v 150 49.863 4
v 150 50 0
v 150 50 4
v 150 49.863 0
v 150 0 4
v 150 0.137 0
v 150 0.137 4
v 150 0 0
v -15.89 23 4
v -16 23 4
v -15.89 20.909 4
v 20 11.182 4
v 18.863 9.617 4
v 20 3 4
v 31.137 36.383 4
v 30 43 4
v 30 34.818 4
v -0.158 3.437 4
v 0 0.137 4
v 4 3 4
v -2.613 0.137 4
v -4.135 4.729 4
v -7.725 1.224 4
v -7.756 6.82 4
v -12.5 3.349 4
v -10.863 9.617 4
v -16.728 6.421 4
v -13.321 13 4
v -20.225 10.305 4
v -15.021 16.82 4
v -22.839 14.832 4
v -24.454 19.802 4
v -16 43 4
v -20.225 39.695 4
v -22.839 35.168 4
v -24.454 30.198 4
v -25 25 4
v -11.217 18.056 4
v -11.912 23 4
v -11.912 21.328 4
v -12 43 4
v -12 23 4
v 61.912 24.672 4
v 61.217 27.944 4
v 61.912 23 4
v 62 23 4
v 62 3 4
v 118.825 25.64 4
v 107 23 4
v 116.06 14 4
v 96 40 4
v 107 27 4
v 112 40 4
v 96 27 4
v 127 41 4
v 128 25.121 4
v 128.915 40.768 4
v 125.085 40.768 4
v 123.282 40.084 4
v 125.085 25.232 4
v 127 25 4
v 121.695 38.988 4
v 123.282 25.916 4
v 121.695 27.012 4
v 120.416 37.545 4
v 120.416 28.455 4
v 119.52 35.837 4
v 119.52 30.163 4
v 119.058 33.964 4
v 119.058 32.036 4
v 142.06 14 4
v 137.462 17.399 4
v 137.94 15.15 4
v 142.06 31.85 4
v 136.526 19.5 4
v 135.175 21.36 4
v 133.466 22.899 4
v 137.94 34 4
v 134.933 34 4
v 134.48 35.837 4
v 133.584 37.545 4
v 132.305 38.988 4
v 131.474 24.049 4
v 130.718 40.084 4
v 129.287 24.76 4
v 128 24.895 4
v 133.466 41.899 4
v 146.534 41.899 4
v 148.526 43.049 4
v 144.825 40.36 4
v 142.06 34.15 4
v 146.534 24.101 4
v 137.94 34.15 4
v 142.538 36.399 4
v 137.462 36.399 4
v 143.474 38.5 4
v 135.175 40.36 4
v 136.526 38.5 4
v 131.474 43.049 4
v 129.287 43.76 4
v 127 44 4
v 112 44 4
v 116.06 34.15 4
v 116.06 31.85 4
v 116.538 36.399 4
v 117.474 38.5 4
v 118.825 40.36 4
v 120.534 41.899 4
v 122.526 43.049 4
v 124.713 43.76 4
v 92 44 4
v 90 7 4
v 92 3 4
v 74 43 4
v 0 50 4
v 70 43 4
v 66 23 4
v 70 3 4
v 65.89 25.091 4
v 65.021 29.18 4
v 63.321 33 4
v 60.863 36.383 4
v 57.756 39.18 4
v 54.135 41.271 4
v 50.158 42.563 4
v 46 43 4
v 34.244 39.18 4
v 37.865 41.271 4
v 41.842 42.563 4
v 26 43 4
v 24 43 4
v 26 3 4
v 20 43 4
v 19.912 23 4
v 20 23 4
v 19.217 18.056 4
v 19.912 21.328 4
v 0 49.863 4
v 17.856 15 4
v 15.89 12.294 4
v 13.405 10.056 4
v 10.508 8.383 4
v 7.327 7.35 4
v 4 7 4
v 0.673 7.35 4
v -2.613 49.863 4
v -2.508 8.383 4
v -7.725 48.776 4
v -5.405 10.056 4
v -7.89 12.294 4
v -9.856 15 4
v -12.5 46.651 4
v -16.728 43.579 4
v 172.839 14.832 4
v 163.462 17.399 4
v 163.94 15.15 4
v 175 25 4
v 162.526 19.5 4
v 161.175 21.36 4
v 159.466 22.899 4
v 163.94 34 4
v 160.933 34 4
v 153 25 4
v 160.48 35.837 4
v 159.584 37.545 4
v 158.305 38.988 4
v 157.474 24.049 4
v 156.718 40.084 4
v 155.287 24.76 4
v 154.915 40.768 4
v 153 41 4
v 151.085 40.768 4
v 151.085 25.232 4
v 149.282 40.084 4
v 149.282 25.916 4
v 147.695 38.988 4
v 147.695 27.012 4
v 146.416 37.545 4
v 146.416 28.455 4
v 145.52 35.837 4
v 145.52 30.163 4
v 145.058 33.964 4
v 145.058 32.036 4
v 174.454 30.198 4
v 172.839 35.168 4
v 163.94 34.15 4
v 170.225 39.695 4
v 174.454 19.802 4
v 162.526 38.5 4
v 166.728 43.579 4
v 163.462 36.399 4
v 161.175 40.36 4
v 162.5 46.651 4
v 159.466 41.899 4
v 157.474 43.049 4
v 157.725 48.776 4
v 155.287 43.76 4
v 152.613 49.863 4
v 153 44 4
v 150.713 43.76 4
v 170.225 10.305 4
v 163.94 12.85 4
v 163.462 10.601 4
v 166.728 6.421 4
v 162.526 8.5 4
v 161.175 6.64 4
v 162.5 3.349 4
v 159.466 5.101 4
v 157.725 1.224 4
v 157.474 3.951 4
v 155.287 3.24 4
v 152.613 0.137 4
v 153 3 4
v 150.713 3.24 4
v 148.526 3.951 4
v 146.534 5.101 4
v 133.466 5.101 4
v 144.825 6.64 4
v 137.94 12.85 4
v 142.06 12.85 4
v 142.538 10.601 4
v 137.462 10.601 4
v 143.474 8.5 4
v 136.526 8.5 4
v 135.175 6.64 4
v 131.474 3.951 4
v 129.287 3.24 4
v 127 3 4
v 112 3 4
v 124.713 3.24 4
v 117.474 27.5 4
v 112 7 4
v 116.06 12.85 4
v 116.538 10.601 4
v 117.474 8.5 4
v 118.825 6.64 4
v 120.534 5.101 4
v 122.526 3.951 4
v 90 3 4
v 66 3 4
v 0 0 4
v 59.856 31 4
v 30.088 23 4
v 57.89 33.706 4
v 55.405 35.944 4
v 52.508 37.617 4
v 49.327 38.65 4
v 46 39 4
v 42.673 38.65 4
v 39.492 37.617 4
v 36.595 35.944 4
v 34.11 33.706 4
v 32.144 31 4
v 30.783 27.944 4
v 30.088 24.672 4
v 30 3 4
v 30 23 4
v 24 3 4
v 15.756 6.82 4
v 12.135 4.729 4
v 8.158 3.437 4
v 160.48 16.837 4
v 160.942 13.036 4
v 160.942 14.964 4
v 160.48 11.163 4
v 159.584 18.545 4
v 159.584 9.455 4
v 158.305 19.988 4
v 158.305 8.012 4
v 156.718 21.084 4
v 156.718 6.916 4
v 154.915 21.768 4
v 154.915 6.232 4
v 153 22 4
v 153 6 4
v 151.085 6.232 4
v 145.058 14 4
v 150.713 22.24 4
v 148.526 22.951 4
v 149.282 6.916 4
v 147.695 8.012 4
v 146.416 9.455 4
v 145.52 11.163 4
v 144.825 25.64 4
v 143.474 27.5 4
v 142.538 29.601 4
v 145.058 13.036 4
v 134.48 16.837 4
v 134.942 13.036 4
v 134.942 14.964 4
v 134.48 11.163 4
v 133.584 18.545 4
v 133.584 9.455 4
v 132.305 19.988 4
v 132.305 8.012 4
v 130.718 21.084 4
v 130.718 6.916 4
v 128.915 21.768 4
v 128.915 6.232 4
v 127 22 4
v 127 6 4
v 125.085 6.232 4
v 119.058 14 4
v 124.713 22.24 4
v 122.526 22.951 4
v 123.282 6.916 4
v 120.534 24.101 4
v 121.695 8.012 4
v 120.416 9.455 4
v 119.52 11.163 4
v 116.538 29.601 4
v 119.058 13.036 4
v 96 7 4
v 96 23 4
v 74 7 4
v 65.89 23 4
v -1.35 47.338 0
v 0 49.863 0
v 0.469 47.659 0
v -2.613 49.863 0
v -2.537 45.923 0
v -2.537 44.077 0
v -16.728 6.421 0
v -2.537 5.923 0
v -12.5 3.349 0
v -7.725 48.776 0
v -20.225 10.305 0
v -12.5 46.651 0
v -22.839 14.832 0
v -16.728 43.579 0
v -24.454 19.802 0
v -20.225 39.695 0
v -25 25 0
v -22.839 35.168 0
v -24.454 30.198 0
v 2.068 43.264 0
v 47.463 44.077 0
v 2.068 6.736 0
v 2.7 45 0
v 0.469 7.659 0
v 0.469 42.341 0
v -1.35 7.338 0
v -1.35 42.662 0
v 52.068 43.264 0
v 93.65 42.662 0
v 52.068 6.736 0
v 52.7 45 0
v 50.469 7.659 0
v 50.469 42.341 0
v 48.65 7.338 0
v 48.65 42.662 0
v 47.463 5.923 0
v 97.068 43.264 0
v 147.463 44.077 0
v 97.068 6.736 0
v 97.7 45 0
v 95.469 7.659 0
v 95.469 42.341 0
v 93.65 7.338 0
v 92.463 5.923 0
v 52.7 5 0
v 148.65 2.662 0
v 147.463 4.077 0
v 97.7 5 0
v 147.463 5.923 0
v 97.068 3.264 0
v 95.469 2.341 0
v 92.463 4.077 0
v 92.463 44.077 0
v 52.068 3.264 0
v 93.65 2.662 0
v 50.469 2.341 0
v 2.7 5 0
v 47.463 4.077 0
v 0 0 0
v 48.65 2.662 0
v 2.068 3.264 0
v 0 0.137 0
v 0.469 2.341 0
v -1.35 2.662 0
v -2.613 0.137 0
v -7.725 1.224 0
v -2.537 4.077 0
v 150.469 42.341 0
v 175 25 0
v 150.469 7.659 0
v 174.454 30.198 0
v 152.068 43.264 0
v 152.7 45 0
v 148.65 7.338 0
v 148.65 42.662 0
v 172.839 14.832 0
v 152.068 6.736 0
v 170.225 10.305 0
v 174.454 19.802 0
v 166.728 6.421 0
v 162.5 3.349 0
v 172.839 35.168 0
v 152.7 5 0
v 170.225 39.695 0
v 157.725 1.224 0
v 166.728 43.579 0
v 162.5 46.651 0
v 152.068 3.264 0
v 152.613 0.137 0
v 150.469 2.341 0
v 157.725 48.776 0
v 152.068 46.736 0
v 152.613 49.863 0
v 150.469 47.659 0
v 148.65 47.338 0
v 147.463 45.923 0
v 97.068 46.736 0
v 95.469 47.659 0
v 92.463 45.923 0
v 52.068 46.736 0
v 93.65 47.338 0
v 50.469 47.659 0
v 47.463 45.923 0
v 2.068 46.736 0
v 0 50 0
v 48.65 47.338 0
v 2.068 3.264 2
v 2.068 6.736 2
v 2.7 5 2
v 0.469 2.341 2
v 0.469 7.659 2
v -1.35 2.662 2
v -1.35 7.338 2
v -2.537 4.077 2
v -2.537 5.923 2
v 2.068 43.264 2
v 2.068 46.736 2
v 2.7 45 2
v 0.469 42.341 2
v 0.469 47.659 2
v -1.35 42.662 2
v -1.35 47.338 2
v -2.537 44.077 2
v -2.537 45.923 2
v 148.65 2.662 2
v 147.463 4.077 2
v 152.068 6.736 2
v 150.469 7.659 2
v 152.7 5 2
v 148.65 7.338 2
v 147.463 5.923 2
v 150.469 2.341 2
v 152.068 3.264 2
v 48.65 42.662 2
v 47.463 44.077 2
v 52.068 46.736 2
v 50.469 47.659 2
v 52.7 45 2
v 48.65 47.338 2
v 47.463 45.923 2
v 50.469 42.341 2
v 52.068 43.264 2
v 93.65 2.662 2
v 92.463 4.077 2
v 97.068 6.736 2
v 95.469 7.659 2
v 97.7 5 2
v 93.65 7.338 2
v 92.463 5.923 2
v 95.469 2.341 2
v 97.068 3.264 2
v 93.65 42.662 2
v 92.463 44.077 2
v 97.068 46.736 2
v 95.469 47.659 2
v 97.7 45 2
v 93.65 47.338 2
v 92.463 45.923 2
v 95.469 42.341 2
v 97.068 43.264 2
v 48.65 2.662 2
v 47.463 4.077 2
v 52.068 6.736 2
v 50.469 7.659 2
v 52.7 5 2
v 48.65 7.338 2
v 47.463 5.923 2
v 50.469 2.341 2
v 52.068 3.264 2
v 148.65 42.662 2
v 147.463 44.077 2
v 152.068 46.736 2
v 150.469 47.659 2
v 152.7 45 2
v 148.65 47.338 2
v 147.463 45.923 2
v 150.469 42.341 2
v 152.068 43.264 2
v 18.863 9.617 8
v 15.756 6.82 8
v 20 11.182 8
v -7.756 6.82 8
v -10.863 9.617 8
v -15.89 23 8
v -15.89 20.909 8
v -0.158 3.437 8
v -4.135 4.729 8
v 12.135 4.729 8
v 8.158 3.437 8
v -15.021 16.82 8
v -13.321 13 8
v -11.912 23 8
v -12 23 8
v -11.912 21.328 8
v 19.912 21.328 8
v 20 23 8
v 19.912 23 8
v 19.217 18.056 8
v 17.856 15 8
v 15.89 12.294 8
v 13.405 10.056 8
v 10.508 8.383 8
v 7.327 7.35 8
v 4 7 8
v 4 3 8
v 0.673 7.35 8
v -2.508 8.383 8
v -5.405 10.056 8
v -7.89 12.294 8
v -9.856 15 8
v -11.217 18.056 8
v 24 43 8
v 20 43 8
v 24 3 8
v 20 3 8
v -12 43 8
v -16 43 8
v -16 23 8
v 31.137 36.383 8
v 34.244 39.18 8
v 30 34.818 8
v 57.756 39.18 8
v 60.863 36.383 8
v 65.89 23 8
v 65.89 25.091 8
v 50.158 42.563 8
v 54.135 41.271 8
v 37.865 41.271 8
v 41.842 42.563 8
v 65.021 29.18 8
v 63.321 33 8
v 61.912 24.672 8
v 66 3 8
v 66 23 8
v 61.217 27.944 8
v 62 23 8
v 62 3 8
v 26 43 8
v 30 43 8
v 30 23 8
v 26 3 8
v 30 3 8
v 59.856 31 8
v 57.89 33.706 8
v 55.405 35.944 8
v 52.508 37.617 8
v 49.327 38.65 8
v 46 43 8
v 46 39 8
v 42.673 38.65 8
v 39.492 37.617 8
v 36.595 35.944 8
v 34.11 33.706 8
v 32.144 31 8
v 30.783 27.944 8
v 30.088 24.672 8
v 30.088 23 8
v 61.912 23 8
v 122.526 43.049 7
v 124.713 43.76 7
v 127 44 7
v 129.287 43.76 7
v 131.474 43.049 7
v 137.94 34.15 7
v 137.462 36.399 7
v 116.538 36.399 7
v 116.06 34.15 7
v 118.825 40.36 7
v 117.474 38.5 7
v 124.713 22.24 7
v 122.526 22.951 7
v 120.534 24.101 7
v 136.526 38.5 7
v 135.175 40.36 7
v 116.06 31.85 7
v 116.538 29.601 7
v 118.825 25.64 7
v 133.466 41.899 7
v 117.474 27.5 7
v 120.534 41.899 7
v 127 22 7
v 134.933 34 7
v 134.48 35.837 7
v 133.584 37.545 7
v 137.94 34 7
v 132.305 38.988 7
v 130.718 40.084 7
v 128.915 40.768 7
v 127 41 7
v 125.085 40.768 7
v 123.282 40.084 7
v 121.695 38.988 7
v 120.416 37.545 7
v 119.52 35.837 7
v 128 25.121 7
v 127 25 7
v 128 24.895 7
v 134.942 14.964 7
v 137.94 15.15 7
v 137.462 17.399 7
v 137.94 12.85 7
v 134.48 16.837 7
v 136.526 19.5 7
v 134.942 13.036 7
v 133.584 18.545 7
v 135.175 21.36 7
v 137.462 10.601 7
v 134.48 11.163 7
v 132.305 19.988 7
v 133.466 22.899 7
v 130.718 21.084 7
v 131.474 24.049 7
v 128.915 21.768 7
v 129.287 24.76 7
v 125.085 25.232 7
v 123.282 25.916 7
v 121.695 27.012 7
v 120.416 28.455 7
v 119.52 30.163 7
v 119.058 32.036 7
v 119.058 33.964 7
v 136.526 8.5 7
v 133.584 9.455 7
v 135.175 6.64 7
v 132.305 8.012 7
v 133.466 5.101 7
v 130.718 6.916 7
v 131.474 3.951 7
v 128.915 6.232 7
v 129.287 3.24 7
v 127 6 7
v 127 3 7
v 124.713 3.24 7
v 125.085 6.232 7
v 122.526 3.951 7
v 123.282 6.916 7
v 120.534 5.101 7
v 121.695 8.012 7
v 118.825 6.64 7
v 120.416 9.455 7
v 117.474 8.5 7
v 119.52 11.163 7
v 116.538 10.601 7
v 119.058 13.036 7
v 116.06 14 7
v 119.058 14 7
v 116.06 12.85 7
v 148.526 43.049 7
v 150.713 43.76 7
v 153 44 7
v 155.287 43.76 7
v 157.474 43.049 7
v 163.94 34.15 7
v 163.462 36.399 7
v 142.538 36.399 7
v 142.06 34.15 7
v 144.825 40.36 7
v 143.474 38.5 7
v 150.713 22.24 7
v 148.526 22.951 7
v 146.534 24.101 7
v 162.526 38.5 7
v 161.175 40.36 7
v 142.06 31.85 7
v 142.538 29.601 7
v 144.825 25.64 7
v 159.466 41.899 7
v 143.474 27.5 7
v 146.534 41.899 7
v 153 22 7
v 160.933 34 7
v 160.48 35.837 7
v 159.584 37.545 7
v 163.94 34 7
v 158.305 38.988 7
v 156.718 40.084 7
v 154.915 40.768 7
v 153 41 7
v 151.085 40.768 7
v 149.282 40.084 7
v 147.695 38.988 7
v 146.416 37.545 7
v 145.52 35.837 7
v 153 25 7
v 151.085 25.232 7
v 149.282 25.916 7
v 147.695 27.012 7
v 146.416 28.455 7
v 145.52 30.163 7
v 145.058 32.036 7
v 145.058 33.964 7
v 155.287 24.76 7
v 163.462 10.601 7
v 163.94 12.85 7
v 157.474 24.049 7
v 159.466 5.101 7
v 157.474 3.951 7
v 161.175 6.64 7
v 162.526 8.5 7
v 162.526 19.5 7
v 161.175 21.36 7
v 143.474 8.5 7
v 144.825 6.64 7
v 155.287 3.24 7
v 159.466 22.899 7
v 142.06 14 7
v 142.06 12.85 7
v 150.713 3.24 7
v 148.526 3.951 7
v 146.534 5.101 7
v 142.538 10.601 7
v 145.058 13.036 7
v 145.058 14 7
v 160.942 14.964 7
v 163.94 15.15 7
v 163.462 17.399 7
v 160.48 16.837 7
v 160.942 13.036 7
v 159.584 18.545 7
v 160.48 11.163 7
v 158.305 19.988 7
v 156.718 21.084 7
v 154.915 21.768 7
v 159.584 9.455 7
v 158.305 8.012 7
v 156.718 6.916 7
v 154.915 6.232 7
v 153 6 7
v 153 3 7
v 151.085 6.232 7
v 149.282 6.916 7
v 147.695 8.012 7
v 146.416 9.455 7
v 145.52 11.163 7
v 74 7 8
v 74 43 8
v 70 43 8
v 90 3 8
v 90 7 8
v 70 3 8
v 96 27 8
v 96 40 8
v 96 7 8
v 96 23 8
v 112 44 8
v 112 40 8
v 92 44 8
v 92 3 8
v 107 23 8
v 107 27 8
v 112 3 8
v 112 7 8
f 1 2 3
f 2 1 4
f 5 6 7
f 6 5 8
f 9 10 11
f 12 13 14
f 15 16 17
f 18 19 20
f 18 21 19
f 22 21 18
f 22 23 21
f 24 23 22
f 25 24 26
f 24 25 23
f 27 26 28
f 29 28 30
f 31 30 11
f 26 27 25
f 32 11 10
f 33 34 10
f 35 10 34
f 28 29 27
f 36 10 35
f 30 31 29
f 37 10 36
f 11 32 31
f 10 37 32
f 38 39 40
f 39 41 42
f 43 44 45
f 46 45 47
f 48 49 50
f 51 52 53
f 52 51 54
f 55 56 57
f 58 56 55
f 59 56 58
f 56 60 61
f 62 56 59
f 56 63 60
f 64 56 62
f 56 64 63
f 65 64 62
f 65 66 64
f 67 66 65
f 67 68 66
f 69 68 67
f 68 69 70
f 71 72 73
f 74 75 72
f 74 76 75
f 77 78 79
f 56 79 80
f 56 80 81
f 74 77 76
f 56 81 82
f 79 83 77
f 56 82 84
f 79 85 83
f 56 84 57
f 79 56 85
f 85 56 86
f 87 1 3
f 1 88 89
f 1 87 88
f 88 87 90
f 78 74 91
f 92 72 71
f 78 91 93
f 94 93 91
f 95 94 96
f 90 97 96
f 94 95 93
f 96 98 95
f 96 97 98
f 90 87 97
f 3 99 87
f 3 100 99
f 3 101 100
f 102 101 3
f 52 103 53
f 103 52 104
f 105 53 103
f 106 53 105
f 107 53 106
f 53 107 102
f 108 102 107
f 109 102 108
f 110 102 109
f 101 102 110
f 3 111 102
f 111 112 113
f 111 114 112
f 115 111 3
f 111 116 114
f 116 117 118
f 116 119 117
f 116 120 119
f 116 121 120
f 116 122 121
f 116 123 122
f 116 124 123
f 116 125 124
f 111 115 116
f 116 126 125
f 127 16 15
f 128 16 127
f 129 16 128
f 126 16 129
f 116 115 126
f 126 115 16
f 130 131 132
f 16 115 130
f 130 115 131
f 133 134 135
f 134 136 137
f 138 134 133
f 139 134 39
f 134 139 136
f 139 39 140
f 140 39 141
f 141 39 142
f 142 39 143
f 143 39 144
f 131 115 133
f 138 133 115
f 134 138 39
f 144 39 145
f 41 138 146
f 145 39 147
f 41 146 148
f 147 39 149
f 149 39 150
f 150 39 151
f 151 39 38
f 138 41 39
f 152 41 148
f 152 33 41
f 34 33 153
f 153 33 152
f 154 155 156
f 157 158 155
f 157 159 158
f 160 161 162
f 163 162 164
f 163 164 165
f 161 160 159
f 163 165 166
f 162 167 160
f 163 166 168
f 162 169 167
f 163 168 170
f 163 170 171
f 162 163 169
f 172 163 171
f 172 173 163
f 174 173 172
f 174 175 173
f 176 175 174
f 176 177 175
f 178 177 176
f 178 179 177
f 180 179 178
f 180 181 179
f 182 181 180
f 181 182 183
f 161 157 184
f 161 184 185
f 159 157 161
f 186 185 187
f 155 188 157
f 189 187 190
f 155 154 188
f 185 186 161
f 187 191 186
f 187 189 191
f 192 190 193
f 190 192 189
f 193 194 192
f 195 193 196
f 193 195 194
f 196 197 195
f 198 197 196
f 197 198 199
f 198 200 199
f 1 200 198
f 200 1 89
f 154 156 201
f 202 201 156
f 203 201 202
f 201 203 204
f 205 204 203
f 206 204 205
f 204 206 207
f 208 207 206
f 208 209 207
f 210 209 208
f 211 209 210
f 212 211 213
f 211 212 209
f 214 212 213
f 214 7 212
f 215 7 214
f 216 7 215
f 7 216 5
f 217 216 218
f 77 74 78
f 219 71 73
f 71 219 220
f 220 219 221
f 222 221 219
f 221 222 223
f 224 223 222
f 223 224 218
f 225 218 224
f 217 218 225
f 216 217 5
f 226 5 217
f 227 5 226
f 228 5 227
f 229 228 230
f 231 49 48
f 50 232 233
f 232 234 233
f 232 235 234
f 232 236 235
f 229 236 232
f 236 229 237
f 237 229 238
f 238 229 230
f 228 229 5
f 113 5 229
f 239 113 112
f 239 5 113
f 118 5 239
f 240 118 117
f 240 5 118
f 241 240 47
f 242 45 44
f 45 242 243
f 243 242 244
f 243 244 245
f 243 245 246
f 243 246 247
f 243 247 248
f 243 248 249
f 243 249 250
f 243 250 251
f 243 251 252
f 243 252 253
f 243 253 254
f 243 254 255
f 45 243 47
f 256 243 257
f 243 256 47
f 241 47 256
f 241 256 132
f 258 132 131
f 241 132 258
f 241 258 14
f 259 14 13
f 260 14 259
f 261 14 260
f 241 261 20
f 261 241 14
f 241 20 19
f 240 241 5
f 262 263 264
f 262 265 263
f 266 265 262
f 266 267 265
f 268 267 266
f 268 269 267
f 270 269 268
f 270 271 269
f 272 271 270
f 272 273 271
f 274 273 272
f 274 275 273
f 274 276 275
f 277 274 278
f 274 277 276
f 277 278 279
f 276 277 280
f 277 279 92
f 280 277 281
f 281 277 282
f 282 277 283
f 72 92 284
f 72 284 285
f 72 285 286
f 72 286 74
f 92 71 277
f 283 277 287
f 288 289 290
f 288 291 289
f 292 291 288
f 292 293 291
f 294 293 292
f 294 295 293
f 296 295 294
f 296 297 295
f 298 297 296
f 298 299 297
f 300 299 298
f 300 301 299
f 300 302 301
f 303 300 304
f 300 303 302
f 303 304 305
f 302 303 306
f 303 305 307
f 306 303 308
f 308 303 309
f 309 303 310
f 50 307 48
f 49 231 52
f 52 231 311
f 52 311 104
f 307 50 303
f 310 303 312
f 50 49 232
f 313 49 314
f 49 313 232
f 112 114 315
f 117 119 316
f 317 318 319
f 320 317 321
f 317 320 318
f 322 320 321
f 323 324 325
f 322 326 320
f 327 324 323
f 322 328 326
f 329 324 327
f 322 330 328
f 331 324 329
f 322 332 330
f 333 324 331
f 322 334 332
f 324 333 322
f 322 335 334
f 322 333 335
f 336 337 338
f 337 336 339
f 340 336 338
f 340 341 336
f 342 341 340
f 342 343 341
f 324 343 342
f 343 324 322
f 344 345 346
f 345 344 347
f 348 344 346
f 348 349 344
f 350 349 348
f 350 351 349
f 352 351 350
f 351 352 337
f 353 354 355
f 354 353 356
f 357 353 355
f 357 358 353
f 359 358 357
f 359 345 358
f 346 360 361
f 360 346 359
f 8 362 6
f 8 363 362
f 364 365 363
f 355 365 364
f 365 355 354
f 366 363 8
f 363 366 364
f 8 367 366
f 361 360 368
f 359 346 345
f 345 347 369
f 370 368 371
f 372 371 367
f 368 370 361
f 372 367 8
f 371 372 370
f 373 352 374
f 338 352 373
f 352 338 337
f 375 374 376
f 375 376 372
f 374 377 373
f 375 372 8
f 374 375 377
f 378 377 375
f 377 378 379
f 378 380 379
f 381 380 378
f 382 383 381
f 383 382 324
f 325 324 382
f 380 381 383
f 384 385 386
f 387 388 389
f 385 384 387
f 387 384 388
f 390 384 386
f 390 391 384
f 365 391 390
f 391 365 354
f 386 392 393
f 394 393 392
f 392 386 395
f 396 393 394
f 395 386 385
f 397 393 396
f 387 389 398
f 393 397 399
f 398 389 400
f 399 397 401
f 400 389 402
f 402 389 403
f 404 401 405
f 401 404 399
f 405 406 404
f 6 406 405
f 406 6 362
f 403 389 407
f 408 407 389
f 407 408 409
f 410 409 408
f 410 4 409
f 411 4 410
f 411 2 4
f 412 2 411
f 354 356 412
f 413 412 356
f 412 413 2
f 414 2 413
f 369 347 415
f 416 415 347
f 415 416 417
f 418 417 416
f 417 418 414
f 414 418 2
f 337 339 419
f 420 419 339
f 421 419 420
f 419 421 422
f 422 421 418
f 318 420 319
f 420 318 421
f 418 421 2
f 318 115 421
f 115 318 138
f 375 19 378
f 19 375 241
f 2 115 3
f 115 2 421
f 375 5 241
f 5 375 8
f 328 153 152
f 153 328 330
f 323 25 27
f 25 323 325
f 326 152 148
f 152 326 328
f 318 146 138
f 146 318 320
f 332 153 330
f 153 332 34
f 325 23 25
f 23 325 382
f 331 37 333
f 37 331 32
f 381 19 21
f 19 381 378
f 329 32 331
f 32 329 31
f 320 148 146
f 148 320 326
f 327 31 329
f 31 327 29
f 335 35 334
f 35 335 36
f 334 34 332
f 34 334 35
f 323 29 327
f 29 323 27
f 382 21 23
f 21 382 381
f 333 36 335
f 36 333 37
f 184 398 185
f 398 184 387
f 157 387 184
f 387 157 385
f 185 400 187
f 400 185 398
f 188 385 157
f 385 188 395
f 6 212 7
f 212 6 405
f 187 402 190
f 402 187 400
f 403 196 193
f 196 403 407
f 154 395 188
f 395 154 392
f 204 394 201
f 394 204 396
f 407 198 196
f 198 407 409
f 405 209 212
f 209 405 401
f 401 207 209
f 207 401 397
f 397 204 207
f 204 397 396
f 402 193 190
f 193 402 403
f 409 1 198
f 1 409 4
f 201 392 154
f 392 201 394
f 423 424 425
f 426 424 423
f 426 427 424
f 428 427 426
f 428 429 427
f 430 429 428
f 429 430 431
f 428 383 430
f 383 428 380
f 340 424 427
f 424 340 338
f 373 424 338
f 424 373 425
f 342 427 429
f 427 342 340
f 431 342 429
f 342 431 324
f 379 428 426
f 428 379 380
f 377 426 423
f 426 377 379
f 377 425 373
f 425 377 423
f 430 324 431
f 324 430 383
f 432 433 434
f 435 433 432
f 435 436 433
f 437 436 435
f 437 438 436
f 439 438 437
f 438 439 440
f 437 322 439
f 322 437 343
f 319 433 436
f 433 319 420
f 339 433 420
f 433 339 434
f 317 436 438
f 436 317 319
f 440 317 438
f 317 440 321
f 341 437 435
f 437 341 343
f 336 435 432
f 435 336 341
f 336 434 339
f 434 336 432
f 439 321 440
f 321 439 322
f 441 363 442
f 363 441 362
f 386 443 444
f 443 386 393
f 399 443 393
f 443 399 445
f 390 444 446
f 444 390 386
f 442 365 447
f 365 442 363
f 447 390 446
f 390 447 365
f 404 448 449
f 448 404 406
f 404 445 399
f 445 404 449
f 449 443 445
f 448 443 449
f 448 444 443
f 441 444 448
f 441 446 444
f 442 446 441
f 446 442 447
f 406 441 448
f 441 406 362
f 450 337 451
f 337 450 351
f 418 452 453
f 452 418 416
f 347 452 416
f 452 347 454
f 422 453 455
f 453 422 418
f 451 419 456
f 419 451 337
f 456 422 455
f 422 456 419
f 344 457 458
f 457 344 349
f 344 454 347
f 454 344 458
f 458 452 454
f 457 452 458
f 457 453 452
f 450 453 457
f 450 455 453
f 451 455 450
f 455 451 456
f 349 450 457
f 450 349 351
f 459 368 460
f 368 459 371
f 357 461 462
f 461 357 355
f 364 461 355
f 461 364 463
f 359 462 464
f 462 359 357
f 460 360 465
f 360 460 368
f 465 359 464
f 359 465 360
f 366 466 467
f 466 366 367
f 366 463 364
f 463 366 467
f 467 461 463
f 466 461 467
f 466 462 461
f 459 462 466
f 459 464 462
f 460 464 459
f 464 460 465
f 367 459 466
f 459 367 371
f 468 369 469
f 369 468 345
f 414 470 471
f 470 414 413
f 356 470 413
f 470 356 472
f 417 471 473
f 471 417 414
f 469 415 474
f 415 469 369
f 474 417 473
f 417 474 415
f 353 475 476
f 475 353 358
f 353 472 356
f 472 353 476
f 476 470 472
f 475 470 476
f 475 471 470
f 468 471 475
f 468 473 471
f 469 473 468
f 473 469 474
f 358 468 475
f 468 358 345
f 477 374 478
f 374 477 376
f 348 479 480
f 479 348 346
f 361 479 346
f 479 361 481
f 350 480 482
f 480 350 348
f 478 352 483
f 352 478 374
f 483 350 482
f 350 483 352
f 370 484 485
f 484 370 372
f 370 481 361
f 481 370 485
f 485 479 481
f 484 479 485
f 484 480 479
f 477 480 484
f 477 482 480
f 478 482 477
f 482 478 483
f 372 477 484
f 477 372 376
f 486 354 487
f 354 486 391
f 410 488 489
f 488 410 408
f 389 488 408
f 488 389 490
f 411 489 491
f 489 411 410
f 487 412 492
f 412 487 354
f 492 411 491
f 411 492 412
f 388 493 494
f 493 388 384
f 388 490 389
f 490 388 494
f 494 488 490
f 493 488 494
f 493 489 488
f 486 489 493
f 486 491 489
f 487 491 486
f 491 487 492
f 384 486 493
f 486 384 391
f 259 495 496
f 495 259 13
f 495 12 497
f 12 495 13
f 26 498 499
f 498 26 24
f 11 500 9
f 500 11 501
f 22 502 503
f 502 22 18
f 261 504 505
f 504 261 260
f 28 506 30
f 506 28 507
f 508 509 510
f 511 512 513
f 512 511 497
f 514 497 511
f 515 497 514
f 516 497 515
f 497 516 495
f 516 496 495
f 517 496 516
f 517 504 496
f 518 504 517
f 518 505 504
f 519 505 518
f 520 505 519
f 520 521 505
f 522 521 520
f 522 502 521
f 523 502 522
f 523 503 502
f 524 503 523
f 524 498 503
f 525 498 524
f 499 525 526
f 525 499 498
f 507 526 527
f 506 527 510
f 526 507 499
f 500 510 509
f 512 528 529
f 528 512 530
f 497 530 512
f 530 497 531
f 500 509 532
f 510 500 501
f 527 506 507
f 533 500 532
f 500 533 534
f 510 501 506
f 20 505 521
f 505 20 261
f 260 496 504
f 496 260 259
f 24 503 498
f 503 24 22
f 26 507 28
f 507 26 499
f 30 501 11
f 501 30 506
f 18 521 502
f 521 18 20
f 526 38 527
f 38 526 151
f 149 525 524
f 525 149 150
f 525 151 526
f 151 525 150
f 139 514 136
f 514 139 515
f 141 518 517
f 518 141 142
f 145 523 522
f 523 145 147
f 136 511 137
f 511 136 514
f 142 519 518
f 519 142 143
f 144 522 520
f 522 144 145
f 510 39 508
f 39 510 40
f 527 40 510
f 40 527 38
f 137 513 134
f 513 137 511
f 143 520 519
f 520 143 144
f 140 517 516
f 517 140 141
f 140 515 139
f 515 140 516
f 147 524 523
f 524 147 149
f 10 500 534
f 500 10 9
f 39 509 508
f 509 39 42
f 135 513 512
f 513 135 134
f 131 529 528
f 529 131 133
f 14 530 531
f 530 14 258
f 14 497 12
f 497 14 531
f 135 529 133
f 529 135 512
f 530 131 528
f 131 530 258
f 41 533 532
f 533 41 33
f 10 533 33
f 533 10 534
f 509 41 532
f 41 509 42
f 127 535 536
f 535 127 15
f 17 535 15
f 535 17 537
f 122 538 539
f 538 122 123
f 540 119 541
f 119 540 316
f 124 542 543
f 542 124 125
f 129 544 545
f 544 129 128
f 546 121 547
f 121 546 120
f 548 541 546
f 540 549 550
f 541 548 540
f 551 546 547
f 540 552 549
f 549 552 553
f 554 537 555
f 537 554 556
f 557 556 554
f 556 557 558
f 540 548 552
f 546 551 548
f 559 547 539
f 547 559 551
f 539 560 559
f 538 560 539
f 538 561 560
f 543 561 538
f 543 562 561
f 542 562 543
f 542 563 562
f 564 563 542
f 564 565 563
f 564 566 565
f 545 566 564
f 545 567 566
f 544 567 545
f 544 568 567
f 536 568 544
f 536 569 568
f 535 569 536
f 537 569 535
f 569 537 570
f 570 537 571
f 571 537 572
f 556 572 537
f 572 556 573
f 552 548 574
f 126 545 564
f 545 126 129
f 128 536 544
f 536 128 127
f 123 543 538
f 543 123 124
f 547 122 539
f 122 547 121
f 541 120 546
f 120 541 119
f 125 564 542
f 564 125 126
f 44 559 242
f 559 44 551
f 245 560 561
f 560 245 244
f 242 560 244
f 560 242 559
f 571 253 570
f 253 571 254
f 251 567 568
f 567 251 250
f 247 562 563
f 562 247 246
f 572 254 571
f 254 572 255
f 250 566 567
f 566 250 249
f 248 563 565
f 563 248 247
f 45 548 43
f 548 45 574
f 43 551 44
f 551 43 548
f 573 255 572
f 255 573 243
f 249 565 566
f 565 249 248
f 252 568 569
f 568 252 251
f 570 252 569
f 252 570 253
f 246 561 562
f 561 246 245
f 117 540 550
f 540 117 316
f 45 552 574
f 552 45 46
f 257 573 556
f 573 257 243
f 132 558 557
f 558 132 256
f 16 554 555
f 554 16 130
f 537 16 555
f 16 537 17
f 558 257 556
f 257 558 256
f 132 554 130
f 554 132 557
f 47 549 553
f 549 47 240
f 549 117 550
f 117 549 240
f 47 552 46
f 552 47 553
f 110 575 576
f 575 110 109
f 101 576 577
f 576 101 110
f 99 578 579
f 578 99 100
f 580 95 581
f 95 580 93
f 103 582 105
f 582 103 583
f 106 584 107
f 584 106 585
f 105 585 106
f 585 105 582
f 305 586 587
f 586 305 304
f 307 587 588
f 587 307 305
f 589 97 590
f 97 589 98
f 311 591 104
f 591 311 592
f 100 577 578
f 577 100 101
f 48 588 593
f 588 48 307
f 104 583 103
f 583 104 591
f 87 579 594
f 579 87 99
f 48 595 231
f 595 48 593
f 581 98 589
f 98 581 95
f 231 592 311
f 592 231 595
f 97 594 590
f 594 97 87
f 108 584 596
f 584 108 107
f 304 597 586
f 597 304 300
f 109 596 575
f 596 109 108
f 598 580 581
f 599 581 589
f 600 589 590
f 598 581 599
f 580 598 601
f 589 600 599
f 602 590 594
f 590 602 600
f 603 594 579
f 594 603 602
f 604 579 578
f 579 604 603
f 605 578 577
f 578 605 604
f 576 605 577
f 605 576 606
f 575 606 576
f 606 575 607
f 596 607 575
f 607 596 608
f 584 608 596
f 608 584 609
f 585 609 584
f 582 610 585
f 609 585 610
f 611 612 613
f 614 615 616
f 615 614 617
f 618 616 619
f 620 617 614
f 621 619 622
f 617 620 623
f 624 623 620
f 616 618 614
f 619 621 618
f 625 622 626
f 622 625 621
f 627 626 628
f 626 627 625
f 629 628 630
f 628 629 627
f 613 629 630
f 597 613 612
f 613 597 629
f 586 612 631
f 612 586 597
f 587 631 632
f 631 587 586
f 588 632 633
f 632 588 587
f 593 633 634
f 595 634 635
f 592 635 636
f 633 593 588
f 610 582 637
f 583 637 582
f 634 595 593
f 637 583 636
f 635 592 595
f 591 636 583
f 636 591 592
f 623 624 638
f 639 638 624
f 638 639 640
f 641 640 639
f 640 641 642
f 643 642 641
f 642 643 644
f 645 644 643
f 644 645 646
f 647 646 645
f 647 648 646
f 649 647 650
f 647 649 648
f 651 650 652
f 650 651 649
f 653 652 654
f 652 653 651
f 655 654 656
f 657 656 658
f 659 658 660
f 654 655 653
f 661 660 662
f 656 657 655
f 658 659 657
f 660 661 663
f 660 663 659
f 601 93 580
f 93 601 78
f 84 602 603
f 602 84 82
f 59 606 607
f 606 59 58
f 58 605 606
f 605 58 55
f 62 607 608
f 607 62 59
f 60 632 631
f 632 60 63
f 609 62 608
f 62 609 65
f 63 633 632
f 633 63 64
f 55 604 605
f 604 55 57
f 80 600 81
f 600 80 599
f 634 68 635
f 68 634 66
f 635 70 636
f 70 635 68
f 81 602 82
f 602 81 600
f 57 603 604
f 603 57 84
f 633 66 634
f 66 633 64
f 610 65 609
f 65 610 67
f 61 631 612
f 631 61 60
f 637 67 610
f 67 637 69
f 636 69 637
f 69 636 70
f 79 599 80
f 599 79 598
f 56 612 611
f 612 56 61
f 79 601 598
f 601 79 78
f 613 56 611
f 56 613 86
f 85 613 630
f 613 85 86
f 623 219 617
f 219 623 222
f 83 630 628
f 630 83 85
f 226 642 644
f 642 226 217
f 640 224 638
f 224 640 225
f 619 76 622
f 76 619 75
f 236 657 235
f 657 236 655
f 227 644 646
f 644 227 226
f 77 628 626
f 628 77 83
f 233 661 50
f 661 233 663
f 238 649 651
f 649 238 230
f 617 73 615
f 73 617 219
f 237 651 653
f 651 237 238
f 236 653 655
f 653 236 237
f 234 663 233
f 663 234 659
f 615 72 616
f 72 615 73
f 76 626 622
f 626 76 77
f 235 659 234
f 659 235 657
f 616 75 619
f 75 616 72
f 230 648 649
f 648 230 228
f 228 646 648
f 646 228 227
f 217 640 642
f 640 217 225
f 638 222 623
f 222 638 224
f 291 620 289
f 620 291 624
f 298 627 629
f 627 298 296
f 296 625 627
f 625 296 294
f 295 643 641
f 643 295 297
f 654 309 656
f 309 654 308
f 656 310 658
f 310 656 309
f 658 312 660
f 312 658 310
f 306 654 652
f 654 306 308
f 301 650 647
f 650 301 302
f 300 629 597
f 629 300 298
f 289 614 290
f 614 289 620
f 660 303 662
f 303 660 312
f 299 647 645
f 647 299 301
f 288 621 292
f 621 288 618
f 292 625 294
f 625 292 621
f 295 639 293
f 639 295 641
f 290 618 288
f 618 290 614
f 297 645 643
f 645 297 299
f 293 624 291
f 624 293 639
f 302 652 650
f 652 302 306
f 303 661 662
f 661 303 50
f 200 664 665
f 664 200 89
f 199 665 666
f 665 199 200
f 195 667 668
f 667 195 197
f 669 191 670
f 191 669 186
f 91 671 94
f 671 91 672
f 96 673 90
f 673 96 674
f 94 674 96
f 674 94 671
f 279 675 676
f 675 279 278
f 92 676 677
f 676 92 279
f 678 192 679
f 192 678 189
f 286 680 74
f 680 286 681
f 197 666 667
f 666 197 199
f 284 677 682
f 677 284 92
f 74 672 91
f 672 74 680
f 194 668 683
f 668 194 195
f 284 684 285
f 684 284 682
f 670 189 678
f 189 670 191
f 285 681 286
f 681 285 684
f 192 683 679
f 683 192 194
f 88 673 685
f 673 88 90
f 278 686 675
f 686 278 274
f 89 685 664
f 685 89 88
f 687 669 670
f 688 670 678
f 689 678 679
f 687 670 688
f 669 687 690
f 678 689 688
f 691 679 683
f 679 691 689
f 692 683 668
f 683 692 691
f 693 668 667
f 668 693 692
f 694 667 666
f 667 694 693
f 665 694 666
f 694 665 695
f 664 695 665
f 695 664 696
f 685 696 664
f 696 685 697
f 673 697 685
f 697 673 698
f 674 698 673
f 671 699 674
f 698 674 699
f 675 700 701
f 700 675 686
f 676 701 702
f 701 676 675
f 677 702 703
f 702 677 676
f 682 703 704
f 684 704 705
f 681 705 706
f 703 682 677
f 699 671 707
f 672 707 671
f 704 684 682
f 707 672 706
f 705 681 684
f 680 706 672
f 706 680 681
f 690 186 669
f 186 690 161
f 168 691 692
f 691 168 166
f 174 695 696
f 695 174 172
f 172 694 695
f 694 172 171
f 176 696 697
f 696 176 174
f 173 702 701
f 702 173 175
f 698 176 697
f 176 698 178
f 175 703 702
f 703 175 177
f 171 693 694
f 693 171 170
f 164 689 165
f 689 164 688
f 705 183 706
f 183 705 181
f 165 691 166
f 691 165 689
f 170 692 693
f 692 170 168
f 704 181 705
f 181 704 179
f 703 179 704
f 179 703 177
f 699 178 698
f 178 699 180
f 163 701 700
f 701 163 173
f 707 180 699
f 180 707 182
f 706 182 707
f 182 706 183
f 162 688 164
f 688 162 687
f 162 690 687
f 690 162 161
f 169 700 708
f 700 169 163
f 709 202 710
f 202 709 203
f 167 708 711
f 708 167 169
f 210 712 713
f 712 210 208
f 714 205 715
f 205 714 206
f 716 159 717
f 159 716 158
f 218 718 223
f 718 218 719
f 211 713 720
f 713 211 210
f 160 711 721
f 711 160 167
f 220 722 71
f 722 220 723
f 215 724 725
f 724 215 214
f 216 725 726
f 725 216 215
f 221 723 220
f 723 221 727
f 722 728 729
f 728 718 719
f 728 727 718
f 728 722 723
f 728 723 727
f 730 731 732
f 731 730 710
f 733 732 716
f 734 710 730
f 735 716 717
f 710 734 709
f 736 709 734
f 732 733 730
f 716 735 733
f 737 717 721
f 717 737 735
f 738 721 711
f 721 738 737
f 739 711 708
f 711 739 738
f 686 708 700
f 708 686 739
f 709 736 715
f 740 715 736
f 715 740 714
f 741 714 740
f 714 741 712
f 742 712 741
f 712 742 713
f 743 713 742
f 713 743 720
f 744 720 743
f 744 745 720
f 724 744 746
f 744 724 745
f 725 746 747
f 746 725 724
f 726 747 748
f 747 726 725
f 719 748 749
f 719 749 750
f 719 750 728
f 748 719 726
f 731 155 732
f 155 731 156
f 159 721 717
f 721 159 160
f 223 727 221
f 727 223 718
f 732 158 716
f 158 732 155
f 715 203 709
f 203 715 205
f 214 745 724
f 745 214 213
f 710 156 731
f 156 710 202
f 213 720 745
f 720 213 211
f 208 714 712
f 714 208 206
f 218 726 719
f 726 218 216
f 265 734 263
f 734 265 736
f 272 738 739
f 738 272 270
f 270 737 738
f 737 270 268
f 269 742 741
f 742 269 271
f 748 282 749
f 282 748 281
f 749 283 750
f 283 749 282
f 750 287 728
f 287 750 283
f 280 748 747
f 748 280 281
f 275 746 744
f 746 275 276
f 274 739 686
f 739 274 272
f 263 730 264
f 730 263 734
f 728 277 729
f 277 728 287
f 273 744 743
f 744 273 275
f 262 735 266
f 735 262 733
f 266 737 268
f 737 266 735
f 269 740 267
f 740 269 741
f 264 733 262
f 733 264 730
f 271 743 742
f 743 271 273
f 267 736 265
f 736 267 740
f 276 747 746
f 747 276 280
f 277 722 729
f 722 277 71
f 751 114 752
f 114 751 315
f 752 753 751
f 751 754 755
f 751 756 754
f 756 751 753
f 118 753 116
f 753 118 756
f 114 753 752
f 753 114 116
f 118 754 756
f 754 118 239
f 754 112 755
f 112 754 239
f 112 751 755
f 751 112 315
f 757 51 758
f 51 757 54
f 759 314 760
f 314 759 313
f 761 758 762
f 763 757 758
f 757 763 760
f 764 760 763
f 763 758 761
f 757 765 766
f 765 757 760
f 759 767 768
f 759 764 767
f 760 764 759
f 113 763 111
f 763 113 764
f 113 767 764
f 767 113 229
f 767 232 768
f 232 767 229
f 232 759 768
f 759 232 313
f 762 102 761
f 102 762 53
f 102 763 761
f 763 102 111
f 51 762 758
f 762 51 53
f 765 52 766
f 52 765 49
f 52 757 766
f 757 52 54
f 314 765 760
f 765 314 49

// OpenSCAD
//основа
difference(){
union(){  
  cube([150,50,4]);
  translate([0,25,0])
  cylinder(4,25,25);
  translate([150,25,0])
  cylinder(4,25,25);
  }
translate([0,5,0]) cylinder(2,2.7,2.7);
translate([0,45,0]) cylinder(2,2.7,2.7);
translate([150,5,0]) cylinder(2,2.7,2.7);
translate([50,45,0]) cylinder(2,2.7,2.7);
translate([95,5,0]) cylinder(2,2.7,2.7);
translate([95,45,0]) cylinder(2,2.7,2.7);
translate([50,5,0]) cylinder(2,2.7,2.7);
translate([150,45,0]) cylinder(2,2.7,2.7);


}
//буква u
  rotate(90,0,0)
   translate([23,-4,4])
union(){
difference(){
 cylinder(4,20,20);
  cylinder(4,16,16);
   translate([0,-20,0]) cube(40);
}
  translate([-20,-20,0]) cube([40,4,4]);
  translate([0,16,0]) cube([20,4,4]);
}

  //буква n
  rotate(-90,0,0)
   translate([-23,46,4])

union(){
difference(){
cylinder(4,20,20);

cylinder(4,16,16);

translate([0,-20,0]) cube(40);
}
  translate([-20,-20,0]) cube([40,4,4]);
  translate([0,16,0]) cube([20,4,4]);
}
  //буква L
  translate([70,3,4]) cube([4,40,4]);
  translate([70,3,4]) cube([20,4,4]);
  
  //буква E
  translate([92,3,4]) cube([4,40,4]);
  translate([92,3,4]) cube([20,4,4]);
  translate([92,40,4]) cube([20,4,4]);
  translate([92,23,4]) cube([15,4,4]);

rotate(90,0,0)
translate([24,-33,4])
union(){

//буква S

difference(){
  translate([9,-94,0]) cylinder(3,11,11);
  translate([9,-94,0]) cylinder(3,8,8);
  translate([-5,-110,0]) cube(15);

}

difference(){
  translate([-10,-94,0]) cylinder(3,11,11);
  translate([-10,-94,0]) cylinder(3,8,8);
  translate([-10,-94,0]) cube(15);

}
difference(){
  translate([9,-120,0]) cylinder(3,11,11);
  translate([9,-120,0]) cylinder(3,8,8);
  translate([-5,-135,0]) cube(15);

}

difference(){
  translate([-10,-120,0]) cylinder(3,11,11);
  translate([-10,-120,0]) cylinder(3,8,8);
  translate([-10,-120,0]) cube(15);

}
}
